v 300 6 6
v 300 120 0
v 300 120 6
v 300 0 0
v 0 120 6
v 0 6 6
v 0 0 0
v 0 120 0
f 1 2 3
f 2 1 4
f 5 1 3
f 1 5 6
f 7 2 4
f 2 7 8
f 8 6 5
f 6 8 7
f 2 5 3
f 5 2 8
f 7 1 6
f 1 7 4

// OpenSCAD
slateWidth = 300;
slateHeight = 120;
slateDepth = 6;
slateEdge = 6;

module chamfer(length) {
  translate([0, 0, slateEdge]) {
    rotate([0, 90, 0]) {
      linear_extrude(height=length, center=false, convexity=10, twist=0) {
        polygon(points=[[0,0],[slateEdge,0],[0,slateEdge]], paths=[[0,1,2]]);
      }
    }
  }
}

difference() {
  cube([slateWidth, slateHeight, slateDepth]);

  chamfer(slateWidth);
}
